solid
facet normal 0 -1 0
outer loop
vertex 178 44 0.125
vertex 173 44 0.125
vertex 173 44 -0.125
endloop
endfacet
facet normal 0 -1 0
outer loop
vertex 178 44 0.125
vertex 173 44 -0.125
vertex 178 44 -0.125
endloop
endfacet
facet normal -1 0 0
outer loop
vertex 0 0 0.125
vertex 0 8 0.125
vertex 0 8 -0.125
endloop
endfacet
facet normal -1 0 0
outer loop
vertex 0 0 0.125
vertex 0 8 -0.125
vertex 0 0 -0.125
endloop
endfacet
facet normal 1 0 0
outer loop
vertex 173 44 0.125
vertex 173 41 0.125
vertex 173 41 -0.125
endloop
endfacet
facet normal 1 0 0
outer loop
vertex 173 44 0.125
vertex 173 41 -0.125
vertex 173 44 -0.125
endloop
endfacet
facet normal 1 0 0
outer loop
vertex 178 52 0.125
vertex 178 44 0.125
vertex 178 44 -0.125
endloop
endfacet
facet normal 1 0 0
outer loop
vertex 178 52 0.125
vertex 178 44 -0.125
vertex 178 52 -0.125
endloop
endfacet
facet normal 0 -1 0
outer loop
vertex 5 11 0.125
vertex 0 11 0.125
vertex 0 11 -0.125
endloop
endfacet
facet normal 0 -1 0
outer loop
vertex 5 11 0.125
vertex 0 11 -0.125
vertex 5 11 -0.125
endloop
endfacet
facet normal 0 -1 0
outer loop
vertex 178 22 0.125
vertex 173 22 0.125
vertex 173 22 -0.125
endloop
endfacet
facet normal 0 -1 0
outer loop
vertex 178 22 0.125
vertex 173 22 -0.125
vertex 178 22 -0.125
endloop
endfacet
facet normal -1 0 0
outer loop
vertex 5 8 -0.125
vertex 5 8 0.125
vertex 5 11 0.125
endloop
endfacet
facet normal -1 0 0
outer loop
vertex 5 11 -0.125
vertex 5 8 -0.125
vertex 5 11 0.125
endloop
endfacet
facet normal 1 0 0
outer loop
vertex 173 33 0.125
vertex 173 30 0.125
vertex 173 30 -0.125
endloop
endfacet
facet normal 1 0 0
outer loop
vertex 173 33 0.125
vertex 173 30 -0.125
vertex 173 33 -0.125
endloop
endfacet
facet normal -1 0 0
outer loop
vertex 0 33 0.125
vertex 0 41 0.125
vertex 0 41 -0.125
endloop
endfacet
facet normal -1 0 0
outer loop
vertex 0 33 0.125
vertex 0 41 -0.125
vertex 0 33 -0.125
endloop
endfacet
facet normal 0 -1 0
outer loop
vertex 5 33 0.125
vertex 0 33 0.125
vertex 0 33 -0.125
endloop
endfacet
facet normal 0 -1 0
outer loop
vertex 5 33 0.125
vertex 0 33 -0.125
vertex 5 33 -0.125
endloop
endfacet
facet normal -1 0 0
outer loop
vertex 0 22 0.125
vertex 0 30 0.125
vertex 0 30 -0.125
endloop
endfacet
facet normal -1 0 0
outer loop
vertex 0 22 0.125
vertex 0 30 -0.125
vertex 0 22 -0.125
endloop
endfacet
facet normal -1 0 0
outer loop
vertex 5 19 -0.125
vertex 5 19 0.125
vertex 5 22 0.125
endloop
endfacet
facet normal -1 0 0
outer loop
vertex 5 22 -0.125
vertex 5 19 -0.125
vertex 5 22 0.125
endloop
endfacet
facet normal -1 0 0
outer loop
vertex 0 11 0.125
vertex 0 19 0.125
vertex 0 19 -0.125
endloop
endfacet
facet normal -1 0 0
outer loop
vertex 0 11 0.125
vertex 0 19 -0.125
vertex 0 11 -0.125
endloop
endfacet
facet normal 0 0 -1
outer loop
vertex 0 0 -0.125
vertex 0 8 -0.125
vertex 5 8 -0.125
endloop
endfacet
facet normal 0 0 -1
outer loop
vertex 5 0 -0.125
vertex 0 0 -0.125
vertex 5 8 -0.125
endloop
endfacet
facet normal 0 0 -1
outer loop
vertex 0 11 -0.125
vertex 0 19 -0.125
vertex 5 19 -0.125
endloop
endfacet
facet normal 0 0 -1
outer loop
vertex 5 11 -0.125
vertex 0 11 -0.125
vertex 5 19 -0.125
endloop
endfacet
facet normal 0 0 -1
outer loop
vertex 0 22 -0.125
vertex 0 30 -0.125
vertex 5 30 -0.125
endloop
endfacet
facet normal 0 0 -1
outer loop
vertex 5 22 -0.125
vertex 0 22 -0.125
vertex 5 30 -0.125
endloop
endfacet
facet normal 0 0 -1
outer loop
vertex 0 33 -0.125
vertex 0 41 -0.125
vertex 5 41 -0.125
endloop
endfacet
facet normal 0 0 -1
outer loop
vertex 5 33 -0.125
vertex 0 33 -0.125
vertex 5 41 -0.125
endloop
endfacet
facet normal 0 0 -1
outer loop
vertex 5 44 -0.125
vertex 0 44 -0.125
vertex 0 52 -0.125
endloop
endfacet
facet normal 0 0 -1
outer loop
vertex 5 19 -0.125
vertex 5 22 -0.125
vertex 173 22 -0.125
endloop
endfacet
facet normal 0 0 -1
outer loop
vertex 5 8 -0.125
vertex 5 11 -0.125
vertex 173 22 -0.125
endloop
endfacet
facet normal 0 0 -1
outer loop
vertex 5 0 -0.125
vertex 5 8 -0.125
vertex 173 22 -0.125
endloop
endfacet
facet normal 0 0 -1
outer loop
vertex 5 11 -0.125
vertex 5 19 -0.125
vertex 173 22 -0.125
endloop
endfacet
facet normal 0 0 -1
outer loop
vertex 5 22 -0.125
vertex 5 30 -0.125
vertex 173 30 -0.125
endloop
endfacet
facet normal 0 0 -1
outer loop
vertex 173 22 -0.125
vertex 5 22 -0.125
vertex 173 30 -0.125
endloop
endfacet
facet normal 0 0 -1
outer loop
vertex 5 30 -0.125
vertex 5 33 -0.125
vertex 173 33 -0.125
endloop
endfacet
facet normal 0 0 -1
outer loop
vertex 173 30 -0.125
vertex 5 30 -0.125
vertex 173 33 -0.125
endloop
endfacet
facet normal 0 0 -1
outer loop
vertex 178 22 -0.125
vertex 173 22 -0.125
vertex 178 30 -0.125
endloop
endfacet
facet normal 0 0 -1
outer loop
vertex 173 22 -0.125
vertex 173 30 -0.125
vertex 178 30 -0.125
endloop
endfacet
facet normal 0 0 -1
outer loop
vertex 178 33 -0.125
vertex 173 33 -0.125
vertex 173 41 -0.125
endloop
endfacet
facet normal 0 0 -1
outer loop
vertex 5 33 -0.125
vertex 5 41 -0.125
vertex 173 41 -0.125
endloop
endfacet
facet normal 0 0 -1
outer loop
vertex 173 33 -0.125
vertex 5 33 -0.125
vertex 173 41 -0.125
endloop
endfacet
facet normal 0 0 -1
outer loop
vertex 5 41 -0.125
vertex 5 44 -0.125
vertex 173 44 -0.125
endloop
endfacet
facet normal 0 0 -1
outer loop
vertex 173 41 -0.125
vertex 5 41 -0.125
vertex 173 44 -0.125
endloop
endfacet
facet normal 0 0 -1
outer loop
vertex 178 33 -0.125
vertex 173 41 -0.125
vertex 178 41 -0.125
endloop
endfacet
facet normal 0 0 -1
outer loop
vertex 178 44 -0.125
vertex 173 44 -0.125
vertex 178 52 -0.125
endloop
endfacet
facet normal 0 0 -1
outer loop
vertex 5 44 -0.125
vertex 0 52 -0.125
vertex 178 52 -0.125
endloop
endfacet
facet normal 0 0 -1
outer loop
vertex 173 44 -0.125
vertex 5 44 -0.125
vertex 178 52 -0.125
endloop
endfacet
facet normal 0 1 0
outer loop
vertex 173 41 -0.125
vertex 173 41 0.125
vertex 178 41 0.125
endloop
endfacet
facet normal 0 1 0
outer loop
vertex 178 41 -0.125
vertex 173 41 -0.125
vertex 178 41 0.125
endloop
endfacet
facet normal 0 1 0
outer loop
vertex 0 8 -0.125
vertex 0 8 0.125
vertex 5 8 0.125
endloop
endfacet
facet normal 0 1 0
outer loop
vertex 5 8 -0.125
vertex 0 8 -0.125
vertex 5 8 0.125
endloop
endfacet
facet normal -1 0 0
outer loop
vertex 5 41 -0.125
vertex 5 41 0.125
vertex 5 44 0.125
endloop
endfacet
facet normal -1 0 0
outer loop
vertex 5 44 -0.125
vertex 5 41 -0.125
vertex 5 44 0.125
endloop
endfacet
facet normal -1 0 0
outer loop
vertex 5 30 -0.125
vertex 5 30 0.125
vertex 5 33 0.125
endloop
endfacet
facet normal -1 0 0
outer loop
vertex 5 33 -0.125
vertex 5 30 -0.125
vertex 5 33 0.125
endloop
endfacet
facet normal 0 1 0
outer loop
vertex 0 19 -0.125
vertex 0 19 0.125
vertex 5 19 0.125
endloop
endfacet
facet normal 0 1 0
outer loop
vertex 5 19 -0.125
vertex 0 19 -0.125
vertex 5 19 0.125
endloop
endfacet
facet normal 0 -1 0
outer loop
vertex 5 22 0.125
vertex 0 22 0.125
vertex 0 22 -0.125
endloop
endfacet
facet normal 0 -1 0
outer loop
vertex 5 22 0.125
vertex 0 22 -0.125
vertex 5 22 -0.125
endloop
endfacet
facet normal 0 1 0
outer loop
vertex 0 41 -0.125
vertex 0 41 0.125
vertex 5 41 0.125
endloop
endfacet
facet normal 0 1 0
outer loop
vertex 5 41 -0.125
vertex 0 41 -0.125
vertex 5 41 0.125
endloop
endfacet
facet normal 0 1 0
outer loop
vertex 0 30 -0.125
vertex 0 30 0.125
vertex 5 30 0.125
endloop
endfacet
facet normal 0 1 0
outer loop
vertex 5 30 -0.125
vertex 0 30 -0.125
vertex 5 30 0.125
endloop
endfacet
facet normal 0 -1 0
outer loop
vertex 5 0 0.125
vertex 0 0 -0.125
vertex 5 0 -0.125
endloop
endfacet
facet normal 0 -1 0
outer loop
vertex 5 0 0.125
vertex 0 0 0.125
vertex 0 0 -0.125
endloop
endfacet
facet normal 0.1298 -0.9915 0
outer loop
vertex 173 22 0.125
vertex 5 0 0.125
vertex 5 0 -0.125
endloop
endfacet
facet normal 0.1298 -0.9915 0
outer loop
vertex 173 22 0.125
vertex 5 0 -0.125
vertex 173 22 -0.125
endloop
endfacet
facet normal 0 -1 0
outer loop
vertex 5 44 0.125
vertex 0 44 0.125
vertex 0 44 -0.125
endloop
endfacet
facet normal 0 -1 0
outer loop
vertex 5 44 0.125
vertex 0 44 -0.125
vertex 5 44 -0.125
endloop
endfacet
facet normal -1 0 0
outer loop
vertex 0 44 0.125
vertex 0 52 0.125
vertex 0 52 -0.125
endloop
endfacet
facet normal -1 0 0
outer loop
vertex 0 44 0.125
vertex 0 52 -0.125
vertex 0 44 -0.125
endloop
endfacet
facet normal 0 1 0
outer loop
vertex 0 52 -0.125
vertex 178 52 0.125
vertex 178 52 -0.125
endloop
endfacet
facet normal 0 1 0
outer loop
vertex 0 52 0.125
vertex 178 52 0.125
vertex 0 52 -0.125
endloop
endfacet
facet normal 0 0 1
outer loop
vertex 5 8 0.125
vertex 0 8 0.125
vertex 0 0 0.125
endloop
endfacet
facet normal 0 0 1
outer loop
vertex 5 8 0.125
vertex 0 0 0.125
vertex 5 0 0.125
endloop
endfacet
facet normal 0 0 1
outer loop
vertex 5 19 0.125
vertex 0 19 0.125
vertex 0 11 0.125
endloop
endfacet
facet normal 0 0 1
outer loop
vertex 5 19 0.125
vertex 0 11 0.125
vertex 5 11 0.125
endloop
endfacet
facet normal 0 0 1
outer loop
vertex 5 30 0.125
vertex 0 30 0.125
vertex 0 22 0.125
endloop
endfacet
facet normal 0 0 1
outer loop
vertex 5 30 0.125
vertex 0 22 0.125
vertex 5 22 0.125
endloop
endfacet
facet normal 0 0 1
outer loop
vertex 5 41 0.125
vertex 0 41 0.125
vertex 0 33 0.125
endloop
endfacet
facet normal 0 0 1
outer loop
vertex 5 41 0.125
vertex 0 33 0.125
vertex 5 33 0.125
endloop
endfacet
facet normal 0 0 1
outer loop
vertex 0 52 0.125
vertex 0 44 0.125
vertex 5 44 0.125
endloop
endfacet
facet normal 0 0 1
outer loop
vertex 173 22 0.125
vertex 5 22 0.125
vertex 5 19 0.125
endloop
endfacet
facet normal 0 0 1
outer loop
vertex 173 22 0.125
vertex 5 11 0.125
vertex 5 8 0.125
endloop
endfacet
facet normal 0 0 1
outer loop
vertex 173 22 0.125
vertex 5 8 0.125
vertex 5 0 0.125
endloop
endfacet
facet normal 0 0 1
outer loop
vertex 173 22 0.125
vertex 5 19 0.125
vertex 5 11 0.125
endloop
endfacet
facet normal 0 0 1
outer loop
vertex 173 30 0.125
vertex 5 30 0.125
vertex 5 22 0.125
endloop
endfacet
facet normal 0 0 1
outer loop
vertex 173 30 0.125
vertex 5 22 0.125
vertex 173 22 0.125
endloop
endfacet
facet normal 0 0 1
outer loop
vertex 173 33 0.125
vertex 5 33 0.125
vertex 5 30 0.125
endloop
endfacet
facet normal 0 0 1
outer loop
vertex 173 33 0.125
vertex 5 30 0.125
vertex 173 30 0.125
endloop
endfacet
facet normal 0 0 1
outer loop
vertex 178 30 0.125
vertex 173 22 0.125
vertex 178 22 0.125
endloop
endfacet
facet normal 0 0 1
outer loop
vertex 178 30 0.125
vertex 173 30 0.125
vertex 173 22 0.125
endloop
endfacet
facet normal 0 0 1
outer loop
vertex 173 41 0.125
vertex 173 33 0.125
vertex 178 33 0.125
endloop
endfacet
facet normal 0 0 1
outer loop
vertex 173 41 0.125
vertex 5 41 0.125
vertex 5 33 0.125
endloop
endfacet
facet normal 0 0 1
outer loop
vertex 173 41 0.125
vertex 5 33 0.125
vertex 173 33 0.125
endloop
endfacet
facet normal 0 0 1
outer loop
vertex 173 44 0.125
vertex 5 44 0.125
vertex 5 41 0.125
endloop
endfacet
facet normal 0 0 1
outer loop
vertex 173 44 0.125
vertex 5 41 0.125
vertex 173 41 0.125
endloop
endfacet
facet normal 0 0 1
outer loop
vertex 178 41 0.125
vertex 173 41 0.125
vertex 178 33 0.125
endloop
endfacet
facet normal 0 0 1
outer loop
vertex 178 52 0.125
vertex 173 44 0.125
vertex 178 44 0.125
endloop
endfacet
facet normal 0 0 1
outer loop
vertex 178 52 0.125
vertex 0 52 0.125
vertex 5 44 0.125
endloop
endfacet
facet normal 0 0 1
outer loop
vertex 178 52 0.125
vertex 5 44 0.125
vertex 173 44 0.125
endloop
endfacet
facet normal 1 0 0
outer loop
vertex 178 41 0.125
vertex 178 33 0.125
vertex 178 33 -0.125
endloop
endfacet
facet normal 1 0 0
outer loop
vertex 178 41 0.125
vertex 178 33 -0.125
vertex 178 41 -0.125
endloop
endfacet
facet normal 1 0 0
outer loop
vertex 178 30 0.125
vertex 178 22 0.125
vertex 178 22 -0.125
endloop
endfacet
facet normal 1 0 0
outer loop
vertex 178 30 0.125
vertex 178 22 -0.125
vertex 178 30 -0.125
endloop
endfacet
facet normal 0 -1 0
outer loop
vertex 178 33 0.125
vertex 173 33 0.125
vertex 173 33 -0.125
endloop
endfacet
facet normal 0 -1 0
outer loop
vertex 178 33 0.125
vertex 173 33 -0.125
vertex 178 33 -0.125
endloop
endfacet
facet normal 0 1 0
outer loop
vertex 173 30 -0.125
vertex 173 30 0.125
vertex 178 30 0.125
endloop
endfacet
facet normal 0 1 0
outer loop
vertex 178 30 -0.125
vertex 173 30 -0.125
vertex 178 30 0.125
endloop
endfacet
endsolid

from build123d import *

# Parameters (mm, degrees)
BOSS_EXTRUDE1_DEPTH  = 0.125
SKETCH4_W            = 5
SKETCH4_H            = 3
CUT_EXTRUDE2_DEPTH   = 186.440185774
LPATTERN3_COUNT      = 4
LPATTERN3_PITCH      = 11
LPATTERN3_COUNT_DIR2 = 2
LPATTERN3_PITCH_DIR2 = 173


with BuildPart() as part:
    # Sketch2 → Boss-Extrude1 (new, symmetric)
    with BuildSketch(Plane.XY):
        Polygon((0, 0), (5, 0), (173, 22), (178, 22), (178, 52), (0, 52), align=None)
    extrude(amount=BOSS_EXTRUDE1_DEPTH, both=True)

    # Sketch4 → Cut-Extrude2 (cut, through all)
    with BuildSketch(Plane.XY.offset(0.125)):
        with Locations((175.5, 42.5)):
            Rectangle(SKETCH4_W, SKETCH4_H)
    cut_extrude2 = extrude(amount=-CUT_EXTRUDE2_DEPTH, mode=Mode.SUBTRACT)

    # LPattern3: Cut-Extrude2 4 × 2
    with Locations(*[(-j * LPATTERN3_PITCH_DIR2, -i * LPATTERN3_PITCH, 0) for i in range(LPATTERN3_COUNT) for j in range(LPATTERN3_COUNT_DIR2) if (i, j) != (0, 0)]):
        add(cut_extrude2, mode=Mode.SUBTRACT)


solid = part.part
